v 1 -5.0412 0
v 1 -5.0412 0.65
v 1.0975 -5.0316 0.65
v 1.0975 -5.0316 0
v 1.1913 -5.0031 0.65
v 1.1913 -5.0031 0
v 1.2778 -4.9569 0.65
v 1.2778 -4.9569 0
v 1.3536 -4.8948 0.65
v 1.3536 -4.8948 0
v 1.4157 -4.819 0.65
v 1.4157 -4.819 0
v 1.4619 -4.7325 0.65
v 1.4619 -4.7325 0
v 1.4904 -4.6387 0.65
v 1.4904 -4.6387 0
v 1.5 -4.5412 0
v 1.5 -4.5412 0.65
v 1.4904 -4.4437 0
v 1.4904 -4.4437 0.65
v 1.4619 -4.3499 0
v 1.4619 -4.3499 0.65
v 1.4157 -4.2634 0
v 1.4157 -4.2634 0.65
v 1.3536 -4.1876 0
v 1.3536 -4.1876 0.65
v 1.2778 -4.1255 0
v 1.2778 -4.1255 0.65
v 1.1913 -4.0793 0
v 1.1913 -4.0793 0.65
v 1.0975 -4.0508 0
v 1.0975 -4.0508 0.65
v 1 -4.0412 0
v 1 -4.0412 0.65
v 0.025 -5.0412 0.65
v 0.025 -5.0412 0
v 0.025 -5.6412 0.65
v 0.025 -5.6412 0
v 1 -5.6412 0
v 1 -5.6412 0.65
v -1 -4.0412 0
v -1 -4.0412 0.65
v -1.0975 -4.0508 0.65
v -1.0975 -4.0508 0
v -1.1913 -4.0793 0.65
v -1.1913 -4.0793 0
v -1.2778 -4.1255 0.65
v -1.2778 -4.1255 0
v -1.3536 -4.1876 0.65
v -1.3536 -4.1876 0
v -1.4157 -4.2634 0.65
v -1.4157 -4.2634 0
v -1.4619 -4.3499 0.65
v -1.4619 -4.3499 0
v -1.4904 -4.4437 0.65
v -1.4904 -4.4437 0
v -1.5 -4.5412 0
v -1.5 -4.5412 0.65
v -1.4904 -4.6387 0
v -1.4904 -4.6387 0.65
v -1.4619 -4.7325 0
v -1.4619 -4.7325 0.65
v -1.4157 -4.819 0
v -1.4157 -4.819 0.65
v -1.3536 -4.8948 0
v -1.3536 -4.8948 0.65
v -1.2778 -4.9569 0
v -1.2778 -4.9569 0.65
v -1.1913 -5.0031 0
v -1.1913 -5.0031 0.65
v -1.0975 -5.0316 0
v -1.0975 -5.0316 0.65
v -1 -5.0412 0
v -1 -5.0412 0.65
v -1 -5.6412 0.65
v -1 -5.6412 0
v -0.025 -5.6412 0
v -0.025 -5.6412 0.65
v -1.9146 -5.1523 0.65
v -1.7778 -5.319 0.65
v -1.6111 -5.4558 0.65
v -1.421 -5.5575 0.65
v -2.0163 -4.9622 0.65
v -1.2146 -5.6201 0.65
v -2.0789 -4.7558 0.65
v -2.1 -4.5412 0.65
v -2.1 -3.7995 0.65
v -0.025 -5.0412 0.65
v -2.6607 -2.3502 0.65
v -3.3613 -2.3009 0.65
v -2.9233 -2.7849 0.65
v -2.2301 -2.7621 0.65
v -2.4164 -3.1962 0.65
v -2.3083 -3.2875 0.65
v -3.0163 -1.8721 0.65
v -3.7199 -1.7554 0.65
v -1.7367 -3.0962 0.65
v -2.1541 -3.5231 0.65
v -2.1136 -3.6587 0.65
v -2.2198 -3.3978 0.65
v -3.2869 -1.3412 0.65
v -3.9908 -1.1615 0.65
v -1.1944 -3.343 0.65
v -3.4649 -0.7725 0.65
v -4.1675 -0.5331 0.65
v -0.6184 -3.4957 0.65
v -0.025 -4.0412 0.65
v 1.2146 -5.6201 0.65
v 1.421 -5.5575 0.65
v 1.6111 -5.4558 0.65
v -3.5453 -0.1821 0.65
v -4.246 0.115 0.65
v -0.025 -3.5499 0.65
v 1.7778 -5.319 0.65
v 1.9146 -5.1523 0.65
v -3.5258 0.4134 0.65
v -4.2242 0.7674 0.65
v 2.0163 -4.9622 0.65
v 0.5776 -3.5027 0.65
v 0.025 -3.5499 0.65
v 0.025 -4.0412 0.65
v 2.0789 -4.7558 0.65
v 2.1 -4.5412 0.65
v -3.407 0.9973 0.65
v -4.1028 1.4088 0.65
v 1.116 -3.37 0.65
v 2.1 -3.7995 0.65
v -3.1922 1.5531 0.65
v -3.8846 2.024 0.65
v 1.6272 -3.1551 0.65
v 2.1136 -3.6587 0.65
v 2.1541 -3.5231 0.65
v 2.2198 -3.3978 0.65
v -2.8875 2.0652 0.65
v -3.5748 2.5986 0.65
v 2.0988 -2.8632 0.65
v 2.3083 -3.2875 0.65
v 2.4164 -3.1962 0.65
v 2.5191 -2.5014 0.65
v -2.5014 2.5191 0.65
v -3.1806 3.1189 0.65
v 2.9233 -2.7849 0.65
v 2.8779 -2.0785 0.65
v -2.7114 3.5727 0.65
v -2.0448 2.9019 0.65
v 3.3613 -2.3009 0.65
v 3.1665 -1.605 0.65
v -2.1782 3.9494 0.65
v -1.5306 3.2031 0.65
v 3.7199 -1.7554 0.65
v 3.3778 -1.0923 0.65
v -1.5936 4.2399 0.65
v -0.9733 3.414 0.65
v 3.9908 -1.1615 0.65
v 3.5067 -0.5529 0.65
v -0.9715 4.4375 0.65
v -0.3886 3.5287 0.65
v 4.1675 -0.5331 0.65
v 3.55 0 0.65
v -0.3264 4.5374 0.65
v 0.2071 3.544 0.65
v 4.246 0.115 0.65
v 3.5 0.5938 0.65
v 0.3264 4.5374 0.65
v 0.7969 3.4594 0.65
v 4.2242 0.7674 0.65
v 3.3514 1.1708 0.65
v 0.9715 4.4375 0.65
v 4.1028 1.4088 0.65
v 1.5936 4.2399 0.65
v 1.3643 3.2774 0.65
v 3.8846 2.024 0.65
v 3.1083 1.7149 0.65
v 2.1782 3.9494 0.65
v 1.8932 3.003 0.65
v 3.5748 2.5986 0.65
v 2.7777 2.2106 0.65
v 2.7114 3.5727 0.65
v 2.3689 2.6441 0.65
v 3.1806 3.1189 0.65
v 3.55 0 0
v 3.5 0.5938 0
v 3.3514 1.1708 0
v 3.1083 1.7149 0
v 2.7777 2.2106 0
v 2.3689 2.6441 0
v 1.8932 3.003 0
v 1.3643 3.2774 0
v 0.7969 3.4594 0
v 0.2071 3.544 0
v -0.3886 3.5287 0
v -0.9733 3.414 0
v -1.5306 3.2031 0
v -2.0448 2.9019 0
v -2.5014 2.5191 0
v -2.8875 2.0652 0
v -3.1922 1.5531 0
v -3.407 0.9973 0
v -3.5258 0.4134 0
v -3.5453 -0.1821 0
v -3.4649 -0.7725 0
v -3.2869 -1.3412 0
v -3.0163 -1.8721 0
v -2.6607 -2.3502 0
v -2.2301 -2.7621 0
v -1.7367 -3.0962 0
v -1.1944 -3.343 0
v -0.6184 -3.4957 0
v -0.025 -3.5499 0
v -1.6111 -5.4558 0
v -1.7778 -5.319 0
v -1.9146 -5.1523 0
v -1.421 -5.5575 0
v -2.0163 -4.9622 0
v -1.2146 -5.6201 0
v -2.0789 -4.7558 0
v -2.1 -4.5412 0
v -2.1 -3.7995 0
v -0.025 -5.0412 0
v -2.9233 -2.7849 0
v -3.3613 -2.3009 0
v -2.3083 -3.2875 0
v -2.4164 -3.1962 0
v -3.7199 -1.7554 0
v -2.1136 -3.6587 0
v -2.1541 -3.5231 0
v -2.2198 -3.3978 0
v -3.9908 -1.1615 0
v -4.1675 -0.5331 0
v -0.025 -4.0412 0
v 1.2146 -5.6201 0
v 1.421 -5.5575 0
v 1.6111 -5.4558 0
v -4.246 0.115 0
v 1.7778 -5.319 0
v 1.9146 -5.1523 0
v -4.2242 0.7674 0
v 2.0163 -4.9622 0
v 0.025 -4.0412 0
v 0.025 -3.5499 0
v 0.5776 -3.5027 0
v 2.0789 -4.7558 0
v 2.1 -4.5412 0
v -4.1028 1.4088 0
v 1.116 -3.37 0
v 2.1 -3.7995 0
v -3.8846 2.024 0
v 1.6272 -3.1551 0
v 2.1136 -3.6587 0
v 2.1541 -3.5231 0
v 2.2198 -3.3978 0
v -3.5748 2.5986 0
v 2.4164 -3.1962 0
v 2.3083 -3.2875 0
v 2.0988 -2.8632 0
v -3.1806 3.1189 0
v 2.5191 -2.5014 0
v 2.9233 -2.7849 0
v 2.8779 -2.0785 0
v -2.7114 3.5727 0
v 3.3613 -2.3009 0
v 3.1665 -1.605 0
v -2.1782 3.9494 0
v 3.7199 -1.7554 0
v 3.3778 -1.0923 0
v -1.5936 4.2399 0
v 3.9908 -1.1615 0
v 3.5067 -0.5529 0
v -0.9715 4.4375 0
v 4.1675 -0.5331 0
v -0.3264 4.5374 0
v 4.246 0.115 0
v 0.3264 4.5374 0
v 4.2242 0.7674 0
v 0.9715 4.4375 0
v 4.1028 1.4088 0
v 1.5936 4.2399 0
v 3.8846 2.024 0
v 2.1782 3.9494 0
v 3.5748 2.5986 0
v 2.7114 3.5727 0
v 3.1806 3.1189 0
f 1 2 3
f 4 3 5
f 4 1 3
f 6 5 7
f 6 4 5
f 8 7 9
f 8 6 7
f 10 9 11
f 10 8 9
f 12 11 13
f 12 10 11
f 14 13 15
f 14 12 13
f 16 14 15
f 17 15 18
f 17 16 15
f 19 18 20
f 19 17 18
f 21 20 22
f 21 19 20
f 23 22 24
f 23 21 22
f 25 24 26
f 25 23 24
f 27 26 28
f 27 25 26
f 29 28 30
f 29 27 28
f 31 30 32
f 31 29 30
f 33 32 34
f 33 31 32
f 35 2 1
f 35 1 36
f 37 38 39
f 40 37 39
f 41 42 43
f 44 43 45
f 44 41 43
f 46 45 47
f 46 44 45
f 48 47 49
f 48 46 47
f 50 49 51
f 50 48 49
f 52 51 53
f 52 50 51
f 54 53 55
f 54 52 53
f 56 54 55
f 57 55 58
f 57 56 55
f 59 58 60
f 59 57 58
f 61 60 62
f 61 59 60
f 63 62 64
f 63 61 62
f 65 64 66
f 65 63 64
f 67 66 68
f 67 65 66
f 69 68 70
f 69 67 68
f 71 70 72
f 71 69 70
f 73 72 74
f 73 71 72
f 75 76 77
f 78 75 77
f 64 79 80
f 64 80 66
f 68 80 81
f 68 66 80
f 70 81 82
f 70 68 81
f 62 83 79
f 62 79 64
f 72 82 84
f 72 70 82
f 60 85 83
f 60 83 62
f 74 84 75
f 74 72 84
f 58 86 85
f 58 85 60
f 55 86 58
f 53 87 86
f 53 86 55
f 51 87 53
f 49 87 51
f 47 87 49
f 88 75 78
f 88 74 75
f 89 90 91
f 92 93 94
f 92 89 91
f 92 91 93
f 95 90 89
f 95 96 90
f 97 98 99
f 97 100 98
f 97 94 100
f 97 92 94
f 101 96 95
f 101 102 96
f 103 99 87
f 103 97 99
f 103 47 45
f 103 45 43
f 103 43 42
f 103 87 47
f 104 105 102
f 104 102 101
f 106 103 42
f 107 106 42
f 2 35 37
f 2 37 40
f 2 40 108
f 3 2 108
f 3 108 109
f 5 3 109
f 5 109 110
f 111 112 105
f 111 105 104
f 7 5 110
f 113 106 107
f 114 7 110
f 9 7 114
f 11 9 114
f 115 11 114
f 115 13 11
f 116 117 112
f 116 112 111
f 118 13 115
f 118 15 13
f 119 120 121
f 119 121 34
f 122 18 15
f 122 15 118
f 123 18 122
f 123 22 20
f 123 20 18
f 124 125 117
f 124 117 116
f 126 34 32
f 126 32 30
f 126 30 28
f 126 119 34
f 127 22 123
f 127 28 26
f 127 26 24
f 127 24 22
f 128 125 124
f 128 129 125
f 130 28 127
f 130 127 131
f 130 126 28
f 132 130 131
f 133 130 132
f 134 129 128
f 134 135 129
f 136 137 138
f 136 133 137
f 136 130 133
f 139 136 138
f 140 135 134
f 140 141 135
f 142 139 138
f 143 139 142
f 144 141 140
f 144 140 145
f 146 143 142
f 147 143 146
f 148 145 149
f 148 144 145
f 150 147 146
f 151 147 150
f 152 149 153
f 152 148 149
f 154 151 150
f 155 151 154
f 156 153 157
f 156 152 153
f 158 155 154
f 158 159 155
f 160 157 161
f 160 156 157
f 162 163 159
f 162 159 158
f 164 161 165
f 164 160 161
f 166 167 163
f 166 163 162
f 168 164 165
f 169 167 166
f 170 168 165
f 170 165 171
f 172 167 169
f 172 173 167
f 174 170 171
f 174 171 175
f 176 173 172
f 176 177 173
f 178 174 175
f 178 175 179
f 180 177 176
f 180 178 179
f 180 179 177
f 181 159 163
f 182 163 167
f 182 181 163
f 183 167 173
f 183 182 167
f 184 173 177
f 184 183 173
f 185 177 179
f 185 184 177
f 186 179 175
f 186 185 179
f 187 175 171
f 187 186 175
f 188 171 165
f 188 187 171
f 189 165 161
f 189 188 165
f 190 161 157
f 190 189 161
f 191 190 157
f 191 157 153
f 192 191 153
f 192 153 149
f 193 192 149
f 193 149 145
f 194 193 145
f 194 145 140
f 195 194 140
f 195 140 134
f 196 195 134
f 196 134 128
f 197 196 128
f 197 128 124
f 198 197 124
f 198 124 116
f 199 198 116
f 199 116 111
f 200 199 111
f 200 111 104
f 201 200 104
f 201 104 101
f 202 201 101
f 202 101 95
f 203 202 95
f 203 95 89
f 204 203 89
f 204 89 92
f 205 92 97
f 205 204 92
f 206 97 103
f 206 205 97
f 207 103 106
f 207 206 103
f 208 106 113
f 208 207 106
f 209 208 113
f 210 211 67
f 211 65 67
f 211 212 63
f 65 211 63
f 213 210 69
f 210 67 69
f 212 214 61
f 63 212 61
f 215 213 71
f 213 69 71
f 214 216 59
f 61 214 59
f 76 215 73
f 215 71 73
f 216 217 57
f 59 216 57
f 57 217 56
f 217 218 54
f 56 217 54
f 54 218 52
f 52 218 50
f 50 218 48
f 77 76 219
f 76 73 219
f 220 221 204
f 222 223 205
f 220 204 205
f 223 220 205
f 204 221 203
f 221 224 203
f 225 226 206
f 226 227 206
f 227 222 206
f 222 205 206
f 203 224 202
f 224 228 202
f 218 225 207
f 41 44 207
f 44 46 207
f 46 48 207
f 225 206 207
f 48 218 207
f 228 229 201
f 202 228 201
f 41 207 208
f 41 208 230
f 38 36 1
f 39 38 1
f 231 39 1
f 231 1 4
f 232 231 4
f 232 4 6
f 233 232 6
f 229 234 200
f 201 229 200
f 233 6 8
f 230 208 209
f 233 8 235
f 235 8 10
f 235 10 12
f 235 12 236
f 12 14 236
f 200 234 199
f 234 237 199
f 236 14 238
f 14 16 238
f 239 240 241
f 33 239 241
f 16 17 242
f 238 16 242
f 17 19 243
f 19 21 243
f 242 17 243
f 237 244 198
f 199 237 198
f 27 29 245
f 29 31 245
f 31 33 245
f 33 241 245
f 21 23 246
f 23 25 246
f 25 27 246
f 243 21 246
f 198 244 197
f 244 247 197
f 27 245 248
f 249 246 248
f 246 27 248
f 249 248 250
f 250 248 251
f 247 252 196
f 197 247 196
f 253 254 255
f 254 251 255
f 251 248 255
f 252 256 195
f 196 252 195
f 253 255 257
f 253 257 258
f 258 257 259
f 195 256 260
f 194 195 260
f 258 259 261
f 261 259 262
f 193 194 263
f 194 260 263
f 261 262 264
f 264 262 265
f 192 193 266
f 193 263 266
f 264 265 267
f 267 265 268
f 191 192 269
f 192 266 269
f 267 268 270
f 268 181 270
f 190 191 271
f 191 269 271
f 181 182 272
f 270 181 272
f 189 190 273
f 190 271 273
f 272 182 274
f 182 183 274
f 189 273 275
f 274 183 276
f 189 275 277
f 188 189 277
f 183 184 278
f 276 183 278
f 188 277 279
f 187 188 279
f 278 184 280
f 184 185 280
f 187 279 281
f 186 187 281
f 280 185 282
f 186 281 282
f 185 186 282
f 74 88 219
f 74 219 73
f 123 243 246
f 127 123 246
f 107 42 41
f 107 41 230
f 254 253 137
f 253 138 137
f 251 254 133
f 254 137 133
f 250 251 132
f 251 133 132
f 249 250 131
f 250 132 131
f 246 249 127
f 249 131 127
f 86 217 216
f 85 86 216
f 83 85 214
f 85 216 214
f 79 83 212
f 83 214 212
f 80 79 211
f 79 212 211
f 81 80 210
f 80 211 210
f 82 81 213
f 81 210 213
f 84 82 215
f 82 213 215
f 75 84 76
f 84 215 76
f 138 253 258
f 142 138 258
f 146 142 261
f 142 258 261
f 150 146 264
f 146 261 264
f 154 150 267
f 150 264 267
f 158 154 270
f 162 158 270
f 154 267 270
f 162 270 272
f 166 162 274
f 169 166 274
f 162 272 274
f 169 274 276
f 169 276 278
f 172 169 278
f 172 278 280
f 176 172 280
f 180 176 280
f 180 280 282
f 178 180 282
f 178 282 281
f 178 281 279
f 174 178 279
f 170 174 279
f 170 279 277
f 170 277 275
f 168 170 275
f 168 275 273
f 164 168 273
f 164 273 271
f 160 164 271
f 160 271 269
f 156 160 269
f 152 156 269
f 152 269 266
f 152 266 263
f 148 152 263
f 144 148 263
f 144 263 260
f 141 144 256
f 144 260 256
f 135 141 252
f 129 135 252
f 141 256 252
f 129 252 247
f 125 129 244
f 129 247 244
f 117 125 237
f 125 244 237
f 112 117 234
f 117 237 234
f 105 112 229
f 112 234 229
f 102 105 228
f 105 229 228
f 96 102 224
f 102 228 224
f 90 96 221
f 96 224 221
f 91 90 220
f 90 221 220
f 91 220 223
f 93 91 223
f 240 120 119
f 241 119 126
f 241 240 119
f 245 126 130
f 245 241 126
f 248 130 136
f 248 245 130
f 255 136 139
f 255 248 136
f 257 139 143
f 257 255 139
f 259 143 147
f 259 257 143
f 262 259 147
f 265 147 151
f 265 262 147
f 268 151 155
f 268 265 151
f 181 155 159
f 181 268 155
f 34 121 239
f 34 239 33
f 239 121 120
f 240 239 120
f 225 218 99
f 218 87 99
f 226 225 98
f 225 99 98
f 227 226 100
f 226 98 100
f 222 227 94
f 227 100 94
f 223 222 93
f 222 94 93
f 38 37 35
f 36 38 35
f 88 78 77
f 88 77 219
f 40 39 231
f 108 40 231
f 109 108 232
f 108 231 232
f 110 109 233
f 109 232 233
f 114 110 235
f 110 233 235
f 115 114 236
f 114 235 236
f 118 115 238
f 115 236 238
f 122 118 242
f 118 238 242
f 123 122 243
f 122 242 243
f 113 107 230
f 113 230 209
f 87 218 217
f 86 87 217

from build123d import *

# Parameters (mm, degrees)
SKETCH_1_R          = 3.55
SKETCH_1_R_2        = 0.5
EXTRUDE_1_DEPTH     = 0.65
SKETCH_2_W          = 0.05
SKETCH_2_H          = 5.641200282
CUT_EXTRUDE_1_DEPTH = 8.092823177
FILLET_1_R          = 0.733333333
CUT_EXTRUDE_2_DEPTH = 8.092823177


with BuildPart() as part:
    # 草图1 → 凸台-拉伸1 (new body)
    with BuildSketch(Plane.XY):
        with BuildLine():
            Line((-1, -5.641200282), (1, -5.641200282))
            ThreePointArc((1, -5.641200282), (1.777817459, -5.319017741), (2.1, -4.541200282))
            Line((2.1, -4.541200282), (2.1, -3.394928957))
            ThreePointArc((2.1, -3.394928957), (0, 4.55), (-2.1, -3.394928957))
            Line((-2.1, -3.394928957), (-2.1, -4.541200282))
            ThreePointArc((-2.1, -4.541200282), (-1.777817459, -5.319017741), (-1, -5.641200282))
        make_face()
        Circle(SKETCH_1_R, mode=Mode.SUBTRACT)
        with Locations((-1, -4.541200282)):
            Circle(SKETCH_1_R_2, mode=Mode.SUBTRACT)
        with Locations(Location((1, -4.541200282, 0), (0, 0, 180))):
            Circle(SKETCH_1_R_2, mode=Mode.SUBTRACT)
    extrude(amount=EXTRUDE_1_DEPTH)

    # 草图2 → 切除-拉伸1 (cut, through all)
    with BuildSketch(Plane.XY.offset(0.65)):
        with Locations((0, -2.820600141)):
            Rectangle(SKETCH_2_W, SKETCH_2_H)
    extrude(amount=-CUT_EXTRUDE_1_DEPTH, mode=Mode.SUBTRACT)

    # 圆角1
    fillet_1_edges = [part.edges().sort_by_distance(p)[0] for p in [
        (-2.1, -3.394928957, 0.325),
        (2.1, -3.394928957, 0.325),
    ]]
    fillet(fillet_1_edges, radius=FILLET_1_R)

    # 草图3 → 切除-拉伸2 (cut, through all)
    with BuildSketch(Plane.XY.offset(0.65)):
        with BuildLine():
            Line((-1, -4.041200282), (1, -4.041200282))
            ThreePointArc((1, -4.041200282), (1.5, -4.541200282), (1, -5.041200282))
            Line((1, -5.041200282), (-1, -5.041200282))
            ThreePointArc((-1, -5.041200282), (-1.5, -4.541200282), (-1, -4.041200282))
        make_face()
    extrude(amount=-CUT_EXTRUDE_2_DEPTH, mode=Mode.SUBTRACT)


solid = part.part
